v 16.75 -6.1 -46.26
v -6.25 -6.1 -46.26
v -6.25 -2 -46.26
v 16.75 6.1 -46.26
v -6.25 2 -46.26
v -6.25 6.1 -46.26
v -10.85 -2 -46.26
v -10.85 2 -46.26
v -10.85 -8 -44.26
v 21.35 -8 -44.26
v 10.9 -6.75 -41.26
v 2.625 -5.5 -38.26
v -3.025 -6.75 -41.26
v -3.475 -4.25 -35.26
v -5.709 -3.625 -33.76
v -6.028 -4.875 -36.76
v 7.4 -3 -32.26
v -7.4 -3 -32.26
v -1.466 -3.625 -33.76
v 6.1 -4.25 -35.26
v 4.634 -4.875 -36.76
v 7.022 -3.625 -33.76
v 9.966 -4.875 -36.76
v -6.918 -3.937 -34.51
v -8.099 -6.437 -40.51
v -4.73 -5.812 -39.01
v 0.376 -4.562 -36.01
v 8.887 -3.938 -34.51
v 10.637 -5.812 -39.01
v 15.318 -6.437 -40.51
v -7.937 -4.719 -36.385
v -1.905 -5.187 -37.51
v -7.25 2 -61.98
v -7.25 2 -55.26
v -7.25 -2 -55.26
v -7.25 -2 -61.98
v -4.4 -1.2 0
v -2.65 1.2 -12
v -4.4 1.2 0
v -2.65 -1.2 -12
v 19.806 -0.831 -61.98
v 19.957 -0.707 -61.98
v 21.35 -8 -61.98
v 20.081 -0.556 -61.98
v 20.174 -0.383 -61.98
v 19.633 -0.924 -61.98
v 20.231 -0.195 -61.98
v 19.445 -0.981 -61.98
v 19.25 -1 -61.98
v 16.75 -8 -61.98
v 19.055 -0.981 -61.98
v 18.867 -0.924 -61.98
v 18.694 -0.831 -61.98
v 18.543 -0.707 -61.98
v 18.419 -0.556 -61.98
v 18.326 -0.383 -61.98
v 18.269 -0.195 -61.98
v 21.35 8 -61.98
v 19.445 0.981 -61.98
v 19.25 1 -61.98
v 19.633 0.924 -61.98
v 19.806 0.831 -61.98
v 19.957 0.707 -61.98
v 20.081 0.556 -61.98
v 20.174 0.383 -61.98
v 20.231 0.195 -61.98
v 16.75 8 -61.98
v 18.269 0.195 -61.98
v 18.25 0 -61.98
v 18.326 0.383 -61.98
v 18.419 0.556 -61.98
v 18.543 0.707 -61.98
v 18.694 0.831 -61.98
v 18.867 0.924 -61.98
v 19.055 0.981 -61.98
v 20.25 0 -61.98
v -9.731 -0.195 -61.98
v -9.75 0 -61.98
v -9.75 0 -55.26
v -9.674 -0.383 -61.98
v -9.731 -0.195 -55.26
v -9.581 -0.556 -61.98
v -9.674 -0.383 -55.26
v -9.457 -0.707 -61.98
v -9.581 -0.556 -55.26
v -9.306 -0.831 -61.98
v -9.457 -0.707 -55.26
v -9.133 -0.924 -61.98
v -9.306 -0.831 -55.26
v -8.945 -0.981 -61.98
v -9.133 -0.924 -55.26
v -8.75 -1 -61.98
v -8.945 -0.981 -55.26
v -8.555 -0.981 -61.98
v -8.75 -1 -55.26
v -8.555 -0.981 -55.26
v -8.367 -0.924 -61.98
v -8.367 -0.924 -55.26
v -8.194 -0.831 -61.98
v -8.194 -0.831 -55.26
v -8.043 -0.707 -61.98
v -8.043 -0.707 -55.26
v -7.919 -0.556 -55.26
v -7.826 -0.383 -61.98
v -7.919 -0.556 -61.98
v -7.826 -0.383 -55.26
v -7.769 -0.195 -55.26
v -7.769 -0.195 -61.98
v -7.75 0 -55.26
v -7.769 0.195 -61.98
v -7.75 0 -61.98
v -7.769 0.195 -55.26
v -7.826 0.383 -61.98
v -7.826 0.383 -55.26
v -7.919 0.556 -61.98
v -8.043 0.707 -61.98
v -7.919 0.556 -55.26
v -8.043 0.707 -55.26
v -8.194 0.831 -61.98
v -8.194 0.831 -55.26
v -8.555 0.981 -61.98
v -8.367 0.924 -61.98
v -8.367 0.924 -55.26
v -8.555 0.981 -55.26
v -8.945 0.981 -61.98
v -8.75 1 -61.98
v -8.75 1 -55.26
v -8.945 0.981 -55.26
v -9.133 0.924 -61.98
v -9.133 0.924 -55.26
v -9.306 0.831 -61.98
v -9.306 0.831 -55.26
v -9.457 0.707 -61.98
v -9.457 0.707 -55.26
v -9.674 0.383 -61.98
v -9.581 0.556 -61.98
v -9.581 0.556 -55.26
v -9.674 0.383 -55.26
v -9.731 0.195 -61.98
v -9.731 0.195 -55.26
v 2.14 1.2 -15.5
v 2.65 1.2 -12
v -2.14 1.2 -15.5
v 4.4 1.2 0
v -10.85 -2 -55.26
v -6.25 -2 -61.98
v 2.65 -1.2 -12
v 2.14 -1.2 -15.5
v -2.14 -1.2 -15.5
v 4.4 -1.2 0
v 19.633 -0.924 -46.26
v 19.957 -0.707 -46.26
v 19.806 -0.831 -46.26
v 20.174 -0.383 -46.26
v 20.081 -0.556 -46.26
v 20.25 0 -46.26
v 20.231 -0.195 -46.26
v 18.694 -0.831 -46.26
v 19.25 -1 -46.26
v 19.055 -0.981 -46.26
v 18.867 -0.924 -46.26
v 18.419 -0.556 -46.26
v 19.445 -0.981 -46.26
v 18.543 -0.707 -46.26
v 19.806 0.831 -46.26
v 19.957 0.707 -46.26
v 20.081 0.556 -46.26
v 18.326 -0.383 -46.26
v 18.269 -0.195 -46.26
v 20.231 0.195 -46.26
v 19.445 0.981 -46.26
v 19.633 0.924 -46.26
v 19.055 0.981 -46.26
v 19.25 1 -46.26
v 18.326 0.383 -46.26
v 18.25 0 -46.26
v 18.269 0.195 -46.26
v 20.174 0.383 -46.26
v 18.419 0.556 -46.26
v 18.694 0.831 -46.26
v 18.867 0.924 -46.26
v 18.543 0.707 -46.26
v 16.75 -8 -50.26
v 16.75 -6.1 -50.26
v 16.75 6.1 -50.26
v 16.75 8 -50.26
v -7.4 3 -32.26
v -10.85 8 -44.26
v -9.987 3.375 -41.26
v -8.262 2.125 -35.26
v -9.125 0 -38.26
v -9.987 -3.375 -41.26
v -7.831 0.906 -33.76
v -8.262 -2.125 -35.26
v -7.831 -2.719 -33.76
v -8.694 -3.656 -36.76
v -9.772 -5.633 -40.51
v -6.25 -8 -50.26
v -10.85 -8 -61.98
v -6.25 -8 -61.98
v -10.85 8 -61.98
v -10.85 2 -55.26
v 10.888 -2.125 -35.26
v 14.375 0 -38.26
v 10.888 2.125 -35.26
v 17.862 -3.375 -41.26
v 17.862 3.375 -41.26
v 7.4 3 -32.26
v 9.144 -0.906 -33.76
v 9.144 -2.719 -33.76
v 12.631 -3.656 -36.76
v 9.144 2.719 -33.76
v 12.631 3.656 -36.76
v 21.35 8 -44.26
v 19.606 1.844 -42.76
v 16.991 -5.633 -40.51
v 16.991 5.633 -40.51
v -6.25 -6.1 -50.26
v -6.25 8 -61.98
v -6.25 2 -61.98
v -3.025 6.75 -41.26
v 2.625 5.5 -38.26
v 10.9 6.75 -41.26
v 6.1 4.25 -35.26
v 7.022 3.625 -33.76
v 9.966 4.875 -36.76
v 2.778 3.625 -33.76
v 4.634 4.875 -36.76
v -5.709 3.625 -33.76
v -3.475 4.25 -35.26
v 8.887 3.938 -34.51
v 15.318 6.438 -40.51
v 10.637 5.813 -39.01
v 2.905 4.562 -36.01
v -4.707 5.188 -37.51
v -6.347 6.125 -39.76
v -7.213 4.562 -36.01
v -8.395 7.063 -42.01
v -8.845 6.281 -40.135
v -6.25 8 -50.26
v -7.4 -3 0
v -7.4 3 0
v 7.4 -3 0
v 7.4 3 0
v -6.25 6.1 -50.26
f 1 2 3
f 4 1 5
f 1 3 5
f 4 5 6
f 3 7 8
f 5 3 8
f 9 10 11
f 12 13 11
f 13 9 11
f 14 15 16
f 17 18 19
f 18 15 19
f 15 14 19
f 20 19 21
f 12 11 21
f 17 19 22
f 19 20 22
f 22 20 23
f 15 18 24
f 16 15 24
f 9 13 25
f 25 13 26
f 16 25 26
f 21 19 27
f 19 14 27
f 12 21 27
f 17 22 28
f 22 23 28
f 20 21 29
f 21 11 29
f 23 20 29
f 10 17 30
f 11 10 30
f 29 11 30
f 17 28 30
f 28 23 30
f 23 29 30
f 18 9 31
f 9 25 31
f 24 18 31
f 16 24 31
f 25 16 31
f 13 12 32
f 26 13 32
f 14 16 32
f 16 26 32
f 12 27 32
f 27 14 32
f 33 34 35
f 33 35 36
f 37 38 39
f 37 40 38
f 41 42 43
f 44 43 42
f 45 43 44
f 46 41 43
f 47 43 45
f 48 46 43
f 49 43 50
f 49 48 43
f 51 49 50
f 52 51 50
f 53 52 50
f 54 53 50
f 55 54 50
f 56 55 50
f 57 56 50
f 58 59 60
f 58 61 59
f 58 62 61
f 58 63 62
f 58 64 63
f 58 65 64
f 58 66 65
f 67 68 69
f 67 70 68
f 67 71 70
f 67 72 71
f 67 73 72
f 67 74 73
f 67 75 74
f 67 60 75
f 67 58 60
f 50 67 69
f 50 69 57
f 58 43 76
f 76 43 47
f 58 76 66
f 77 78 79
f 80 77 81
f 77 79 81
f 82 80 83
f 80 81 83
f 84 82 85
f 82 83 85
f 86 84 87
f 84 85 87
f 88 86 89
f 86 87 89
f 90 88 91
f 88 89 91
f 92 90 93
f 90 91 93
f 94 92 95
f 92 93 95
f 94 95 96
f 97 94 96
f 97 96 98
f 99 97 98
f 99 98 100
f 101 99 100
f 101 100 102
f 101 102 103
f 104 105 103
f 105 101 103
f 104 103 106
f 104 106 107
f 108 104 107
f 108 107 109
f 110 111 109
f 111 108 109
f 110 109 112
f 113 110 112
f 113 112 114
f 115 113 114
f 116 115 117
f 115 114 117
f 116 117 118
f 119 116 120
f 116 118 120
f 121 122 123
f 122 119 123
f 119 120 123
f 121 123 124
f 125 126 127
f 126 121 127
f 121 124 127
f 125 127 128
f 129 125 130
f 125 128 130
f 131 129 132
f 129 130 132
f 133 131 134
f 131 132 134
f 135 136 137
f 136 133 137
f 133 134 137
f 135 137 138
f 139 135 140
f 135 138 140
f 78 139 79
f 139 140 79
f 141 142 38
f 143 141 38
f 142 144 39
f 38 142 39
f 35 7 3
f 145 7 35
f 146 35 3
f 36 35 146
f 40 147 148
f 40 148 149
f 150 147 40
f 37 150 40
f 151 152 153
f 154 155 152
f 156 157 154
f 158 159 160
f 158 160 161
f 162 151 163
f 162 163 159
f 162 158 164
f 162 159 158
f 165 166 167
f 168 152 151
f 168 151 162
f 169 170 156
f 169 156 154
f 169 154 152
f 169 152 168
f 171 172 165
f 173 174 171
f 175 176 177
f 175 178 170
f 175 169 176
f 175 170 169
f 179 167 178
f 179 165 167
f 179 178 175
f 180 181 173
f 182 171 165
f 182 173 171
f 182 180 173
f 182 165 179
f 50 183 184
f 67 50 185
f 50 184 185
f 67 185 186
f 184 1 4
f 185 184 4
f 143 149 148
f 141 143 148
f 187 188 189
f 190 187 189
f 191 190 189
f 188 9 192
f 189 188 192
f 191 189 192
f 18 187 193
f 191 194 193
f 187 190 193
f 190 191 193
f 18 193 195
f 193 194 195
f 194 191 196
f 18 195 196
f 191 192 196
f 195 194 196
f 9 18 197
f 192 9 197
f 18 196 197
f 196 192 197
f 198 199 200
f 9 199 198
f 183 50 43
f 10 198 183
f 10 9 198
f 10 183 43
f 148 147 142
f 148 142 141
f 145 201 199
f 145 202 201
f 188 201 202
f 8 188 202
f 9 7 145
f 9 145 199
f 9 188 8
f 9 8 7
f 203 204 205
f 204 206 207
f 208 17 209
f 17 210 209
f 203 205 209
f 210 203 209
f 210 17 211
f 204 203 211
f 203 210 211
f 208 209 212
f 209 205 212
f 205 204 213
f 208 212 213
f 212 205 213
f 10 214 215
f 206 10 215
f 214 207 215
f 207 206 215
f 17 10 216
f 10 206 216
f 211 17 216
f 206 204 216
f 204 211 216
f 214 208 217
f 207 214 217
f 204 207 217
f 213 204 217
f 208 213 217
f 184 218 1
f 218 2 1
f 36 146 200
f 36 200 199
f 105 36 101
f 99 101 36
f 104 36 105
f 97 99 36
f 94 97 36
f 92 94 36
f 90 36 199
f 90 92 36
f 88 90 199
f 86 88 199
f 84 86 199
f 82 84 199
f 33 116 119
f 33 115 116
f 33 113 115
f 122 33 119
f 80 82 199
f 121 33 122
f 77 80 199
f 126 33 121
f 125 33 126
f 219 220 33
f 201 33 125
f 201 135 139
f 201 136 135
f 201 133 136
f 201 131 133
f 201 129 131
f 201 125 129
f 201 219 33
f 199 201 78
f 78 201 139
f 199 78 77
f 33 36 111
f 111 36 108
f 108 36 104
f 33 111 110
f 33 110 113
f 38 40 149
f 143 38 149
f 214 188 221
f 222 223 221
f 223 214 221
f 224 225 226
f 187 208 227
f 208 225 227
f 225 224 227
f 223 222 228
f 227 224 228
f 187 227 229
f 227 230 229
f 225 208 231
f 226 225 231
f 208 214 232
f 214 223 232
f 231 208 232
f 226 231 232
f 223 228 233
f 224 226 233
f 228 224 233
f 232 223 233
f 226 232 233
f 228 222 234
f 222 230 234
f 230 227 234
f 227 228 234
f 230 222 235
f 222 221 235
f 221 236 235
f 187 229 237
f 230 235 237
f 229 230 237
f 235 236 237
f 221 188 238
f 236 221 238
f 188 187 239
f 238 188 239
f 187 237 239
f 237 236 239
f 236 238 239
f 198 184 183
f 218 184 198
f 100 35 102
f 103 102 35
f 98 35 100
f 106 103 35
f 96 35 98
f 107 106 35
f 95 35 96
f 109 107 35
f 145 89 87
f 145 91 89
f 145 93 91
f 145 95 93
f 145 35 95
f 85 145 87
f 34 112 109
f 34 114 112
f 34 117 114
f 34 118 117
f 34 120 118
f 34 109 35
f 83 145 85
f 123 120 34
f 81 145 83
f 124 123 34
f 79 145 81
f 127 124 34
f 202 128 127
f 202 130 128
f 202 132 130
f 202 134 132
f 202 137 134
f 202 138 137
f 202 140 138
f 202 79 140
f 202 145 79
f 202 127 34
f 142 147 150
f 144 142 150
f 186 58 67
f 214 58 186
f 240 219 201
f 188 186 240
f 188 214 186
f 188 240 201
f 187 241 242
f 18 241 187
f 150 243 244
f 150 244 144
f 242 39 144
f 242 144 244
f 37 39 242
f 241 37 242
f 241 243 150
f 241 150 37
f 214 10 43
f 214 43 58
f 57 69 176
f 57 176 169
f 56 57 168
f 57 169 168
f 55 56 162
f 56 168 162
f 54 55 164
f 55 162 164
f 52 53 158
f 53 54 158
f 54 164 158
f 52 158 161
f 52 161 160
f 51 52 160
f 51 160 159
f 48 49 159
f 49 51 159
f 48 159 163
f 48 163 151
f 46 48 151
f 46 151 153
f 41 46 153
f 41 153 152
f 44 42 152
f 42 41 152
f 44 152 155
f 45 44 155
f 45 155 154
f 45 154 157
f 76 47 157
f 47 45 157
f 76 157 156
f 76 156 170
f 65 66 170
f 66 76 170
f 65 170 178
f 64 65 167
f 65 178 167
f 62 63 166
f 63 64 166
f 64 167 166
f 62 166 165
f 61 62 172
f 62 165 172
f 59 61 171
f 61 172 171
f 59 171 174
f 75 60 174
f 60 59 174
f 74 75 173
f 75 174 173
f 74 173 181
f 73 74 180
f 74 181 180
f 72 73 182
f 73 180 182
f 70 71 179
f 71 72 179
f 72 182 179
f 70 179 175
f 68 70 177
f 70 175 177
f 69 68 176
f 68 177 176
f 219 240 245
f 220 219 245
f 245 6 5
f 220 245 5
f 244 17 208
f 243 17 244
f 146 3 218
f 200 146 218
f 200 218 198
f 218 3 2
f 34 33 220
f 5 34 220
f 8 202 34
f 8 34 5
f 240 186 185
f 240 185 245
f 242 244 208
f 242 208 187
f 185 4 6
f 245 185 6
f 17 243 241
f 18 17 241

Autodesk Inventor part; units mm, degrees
ref_plane "YZ Plane" through (0, 0, 0) normal (1, 0, 0) x (0, 1, 0)
ref_plane "XZ Plane" through (0, 0, 0) normal (0, 1, 0) x (-1, 0, 0)
ref_plane "XY Plane" through (0, 0, 0) normal (0, 0, 1) x (1, 0, 0)
sketch "Sketch1" plane through (0, 0, 0) normal (0, 1, 0) x (-1, 0, 0)
  line L0 (-4.4, 0) -> (4.4, 0) construction
  line L1 (0, 0) -> (0, -12) construction
  line L2 (2.65, -12) -> (-2.65, -12) construction
  line L3 (2.65, -12) -> (4.4, 0)
  line L4 (-2.65, -12) -> (-4.4, 0)
  line L5 (0, -12) -> (0, -15.5) construction
  line L6 (0, -15.5) -> (-4, -15.5) construction
  line L7 (0, -15.5) -> (4, -15.5) construction
  line L8 (0, -15.5) -> (4, -15.5) construction
  line L9 (2.65, -12) -> (2.1396, -15.5)
  line L10 (-2.65, -12) -> (-2.1396, -15.5)
  line L11 (2.1396, -15.5) -> (-2.1396, -15.5)
  line L12 (-7.4, 0) -> (12.6, 0) construction
  line L13 (4.4, 0) -> (-4.4, 0)
  dimension "d0" = 8.8
  dimension "d1" = 12
  dimension "d2" = 5.3
  dimension "d3" = 3.5
  dimension "d4" = 4
  dimension "d5" = 4
  dimension "d7" = 3
sketch "Sketch2" plane through (0, 0, 0) normal (0, 1, 0) x (-1, 0, 0)
  line L0 (7.4, -46.26) -> (-7.4, -46.26)
  line L1 (-7.4, -46.26) -> (-7.4, 0)
  line L2 (-7.4, 0) -> (7.4, 0)
  line L3 (7.4, 0) -> (7.4, -46.26)
  line L4 (0, 0) -> (0, 4) construction
  line L5 (0, 0) -> (0, -46.26) construction
  dimension "d18" = 4
  dimension "d19" = 50.26
  dimension "d20" = 14.8
extrude "Extrusion1" add sketch "Sketch2" along normal mid plane 6
extrude "Extrusion2" cut sketch "Sketch1" along normal mid plane 2.4
sketch "Sketch3" plane through (0, 0, 0) normal (0, 1, 0) x (-1, 0, 0)
  line L0 (0, 0) -> (0, 4) construction
  line L1 (0, 0) -> (0, -46.26) construction
  dimension "d15" = 4
  dimension "d17" = 50.26
sketch "Sketch4" plane through (7.4, 3, -46.26) normal (0, 0, -1) x (-1, 0, 0)
  line L0 (-13.95, 5) -> (18.25, 5)
  line L1 (18.25, 5) -> (18.25, -11)
  line L2 (18.25, -11) -> (-13.95, -11)
  line L3 (-13.95, -11) -> (-13.95, 5)
  line L4 (-9.35, 3.1) -> (13.65, 3.1)
  line L5 (13.65, 3.1) -> (13.65, -9.1)
  line L6 (13.65, -9.1) -> (-9.35, -9.1)
  line L7 (-9.35, -9.1) -> (-9.35, 3.1)
  line L8 (2.15, 5) -> (2.15, -11) construction
  line L9 (18.25, -3) -> (-13.95, -3) construction
  line L10 (-9.35, 3.1) -> (-9.35, 5)
  line L11 (13.65, 3.1) -> (13.65, 5)
  line L12 (13.65, -9.1) -> (13.65, -11)
  line L13 (-9.35, -9.1) -> (-9.35, -11)
  circle A0 centre (16.15, -3) radius 1
  circle A1 centre (-11.85, -3) radius 1
  point P0 (7.4, -3)
  point P1 (2.15, -3)
  dimension "d21" = 32.2
  dimension "d22" = 16
  dimension "d23" = 23
  dimension "d24" = 12.2
  dimension "d25" = 2.5
  dimension "d26" = 2
  dimension "d27" = 2.5
  dimension "d28" = 2
  dimension "d43" = 5.25
extrude "Extrusion3" add sketch "Sketch4" along normal blind 15.72 and the other way blind 2 contours L0 L10 L7 L13 L2 L3 | L0 L1 L2 L12 L5 L11
extrude "Extrusion4" add sketch "Sketch4" along normal blind 4 and the other way blind 2 contours L0 L11 L4 L10 | L13 L6 L12 L2
extrude "Extrusion5" add sketch "Sketch4" against normal blind 2 contours A0 | A1
extrude "Extrusion6" add sketch "Sketch4" against normal blind 2 contours L4 L5 L6 L7
sketch "Sketch5" plane through (-10.85, -8, -61.98) normal (-1, 0, 0) x (0, 0, 1)
  line L0 (15.72, 1.9) -> (15.72, 14.1) projected
  line L1 (15.72, 8) -> (6.72, 8) construction
  line L2 (15.72, 6) -> (6.72, 6)
  line L3 (6.72, 6) -> (6.72, 10)
  line L4 (6.72, 10) -> (15.72, 10)
  line L5 (15.72, 10) -> (15.72, 6)
  line L6 (15.72, 6) -> (6.72, 10) construction
  line L7 (6.72, 6) -> (15.72, 10) construction
  point P0 (61.98, 8)
  point P1 (11.22, 8)
  dimension "d44" = 9
  dimension "d45" = 4
extrude "Extrusion7" cut sketch "Sketch5" against normal blind 6
sketch "Sketch6" plane through (-6.25, -8, -61.98) normal (1, 0, 0) x (0, 0, -1)
  line L0 (-15.72, 10) -> (-6.72, 10) projected
  line L1 (0, 0) -> (0, 16) projected
  line L2 (-6.72, 10) -> (0, 10)
  line L3 (0, 10) -> (0, 6)
  line L4 (0, 6) -> (-6.72, 6)
  line L5 (-6.72, 6) -> (-6.72, 10)
  point P0 (-61.98, 8)
  dimension "d48" = 4
extrude "Extrusion8" cut sketch "Sketch6" against normal blind 1
ref_plane "Work Plane1" through (7.4, 3, -32.26) normal (0, 0, 1) x (1, 0, 0)
sketch "Sketch7" plane through (7.4, 3, -32.26) normal (0, 0, 1) x (1, 0, 0)
  line L0 (-14.8, 0) -> (0, 0) projected
  line L1 (0, 0) -> (0, -6) projected
  line L2 (0, -6) -> (-14.8, -6) projected
  line L3 (-14.8, 0) -> (-14.8, -6) projected
  point P0 (-7.4, -3)
sketch "Sketch8" plane through (7.4, 3, -44.26) normal (0, 0, 1) x (1, 0, 0)
  line L0 (13.95, 5) -> (-18.25, 5) projected
  line L1 (-18.25, 5) -> (-18.25, -11) projected
  line L2 (-18.25, -11) -> (13.95, -11) projected
  line L3 (13.95, -11) -> (13.95, 5) projected
  point P0 (-7.4, -3)
loft "Loft1" add profiles "Sketch7" section 2 edges at (5.25, 8, -44.26) (-10.85, 0, -44.26) (5.25, -8, -44.26) (21.35, 0, -44.26)
properties part number "tilt_pillar"
